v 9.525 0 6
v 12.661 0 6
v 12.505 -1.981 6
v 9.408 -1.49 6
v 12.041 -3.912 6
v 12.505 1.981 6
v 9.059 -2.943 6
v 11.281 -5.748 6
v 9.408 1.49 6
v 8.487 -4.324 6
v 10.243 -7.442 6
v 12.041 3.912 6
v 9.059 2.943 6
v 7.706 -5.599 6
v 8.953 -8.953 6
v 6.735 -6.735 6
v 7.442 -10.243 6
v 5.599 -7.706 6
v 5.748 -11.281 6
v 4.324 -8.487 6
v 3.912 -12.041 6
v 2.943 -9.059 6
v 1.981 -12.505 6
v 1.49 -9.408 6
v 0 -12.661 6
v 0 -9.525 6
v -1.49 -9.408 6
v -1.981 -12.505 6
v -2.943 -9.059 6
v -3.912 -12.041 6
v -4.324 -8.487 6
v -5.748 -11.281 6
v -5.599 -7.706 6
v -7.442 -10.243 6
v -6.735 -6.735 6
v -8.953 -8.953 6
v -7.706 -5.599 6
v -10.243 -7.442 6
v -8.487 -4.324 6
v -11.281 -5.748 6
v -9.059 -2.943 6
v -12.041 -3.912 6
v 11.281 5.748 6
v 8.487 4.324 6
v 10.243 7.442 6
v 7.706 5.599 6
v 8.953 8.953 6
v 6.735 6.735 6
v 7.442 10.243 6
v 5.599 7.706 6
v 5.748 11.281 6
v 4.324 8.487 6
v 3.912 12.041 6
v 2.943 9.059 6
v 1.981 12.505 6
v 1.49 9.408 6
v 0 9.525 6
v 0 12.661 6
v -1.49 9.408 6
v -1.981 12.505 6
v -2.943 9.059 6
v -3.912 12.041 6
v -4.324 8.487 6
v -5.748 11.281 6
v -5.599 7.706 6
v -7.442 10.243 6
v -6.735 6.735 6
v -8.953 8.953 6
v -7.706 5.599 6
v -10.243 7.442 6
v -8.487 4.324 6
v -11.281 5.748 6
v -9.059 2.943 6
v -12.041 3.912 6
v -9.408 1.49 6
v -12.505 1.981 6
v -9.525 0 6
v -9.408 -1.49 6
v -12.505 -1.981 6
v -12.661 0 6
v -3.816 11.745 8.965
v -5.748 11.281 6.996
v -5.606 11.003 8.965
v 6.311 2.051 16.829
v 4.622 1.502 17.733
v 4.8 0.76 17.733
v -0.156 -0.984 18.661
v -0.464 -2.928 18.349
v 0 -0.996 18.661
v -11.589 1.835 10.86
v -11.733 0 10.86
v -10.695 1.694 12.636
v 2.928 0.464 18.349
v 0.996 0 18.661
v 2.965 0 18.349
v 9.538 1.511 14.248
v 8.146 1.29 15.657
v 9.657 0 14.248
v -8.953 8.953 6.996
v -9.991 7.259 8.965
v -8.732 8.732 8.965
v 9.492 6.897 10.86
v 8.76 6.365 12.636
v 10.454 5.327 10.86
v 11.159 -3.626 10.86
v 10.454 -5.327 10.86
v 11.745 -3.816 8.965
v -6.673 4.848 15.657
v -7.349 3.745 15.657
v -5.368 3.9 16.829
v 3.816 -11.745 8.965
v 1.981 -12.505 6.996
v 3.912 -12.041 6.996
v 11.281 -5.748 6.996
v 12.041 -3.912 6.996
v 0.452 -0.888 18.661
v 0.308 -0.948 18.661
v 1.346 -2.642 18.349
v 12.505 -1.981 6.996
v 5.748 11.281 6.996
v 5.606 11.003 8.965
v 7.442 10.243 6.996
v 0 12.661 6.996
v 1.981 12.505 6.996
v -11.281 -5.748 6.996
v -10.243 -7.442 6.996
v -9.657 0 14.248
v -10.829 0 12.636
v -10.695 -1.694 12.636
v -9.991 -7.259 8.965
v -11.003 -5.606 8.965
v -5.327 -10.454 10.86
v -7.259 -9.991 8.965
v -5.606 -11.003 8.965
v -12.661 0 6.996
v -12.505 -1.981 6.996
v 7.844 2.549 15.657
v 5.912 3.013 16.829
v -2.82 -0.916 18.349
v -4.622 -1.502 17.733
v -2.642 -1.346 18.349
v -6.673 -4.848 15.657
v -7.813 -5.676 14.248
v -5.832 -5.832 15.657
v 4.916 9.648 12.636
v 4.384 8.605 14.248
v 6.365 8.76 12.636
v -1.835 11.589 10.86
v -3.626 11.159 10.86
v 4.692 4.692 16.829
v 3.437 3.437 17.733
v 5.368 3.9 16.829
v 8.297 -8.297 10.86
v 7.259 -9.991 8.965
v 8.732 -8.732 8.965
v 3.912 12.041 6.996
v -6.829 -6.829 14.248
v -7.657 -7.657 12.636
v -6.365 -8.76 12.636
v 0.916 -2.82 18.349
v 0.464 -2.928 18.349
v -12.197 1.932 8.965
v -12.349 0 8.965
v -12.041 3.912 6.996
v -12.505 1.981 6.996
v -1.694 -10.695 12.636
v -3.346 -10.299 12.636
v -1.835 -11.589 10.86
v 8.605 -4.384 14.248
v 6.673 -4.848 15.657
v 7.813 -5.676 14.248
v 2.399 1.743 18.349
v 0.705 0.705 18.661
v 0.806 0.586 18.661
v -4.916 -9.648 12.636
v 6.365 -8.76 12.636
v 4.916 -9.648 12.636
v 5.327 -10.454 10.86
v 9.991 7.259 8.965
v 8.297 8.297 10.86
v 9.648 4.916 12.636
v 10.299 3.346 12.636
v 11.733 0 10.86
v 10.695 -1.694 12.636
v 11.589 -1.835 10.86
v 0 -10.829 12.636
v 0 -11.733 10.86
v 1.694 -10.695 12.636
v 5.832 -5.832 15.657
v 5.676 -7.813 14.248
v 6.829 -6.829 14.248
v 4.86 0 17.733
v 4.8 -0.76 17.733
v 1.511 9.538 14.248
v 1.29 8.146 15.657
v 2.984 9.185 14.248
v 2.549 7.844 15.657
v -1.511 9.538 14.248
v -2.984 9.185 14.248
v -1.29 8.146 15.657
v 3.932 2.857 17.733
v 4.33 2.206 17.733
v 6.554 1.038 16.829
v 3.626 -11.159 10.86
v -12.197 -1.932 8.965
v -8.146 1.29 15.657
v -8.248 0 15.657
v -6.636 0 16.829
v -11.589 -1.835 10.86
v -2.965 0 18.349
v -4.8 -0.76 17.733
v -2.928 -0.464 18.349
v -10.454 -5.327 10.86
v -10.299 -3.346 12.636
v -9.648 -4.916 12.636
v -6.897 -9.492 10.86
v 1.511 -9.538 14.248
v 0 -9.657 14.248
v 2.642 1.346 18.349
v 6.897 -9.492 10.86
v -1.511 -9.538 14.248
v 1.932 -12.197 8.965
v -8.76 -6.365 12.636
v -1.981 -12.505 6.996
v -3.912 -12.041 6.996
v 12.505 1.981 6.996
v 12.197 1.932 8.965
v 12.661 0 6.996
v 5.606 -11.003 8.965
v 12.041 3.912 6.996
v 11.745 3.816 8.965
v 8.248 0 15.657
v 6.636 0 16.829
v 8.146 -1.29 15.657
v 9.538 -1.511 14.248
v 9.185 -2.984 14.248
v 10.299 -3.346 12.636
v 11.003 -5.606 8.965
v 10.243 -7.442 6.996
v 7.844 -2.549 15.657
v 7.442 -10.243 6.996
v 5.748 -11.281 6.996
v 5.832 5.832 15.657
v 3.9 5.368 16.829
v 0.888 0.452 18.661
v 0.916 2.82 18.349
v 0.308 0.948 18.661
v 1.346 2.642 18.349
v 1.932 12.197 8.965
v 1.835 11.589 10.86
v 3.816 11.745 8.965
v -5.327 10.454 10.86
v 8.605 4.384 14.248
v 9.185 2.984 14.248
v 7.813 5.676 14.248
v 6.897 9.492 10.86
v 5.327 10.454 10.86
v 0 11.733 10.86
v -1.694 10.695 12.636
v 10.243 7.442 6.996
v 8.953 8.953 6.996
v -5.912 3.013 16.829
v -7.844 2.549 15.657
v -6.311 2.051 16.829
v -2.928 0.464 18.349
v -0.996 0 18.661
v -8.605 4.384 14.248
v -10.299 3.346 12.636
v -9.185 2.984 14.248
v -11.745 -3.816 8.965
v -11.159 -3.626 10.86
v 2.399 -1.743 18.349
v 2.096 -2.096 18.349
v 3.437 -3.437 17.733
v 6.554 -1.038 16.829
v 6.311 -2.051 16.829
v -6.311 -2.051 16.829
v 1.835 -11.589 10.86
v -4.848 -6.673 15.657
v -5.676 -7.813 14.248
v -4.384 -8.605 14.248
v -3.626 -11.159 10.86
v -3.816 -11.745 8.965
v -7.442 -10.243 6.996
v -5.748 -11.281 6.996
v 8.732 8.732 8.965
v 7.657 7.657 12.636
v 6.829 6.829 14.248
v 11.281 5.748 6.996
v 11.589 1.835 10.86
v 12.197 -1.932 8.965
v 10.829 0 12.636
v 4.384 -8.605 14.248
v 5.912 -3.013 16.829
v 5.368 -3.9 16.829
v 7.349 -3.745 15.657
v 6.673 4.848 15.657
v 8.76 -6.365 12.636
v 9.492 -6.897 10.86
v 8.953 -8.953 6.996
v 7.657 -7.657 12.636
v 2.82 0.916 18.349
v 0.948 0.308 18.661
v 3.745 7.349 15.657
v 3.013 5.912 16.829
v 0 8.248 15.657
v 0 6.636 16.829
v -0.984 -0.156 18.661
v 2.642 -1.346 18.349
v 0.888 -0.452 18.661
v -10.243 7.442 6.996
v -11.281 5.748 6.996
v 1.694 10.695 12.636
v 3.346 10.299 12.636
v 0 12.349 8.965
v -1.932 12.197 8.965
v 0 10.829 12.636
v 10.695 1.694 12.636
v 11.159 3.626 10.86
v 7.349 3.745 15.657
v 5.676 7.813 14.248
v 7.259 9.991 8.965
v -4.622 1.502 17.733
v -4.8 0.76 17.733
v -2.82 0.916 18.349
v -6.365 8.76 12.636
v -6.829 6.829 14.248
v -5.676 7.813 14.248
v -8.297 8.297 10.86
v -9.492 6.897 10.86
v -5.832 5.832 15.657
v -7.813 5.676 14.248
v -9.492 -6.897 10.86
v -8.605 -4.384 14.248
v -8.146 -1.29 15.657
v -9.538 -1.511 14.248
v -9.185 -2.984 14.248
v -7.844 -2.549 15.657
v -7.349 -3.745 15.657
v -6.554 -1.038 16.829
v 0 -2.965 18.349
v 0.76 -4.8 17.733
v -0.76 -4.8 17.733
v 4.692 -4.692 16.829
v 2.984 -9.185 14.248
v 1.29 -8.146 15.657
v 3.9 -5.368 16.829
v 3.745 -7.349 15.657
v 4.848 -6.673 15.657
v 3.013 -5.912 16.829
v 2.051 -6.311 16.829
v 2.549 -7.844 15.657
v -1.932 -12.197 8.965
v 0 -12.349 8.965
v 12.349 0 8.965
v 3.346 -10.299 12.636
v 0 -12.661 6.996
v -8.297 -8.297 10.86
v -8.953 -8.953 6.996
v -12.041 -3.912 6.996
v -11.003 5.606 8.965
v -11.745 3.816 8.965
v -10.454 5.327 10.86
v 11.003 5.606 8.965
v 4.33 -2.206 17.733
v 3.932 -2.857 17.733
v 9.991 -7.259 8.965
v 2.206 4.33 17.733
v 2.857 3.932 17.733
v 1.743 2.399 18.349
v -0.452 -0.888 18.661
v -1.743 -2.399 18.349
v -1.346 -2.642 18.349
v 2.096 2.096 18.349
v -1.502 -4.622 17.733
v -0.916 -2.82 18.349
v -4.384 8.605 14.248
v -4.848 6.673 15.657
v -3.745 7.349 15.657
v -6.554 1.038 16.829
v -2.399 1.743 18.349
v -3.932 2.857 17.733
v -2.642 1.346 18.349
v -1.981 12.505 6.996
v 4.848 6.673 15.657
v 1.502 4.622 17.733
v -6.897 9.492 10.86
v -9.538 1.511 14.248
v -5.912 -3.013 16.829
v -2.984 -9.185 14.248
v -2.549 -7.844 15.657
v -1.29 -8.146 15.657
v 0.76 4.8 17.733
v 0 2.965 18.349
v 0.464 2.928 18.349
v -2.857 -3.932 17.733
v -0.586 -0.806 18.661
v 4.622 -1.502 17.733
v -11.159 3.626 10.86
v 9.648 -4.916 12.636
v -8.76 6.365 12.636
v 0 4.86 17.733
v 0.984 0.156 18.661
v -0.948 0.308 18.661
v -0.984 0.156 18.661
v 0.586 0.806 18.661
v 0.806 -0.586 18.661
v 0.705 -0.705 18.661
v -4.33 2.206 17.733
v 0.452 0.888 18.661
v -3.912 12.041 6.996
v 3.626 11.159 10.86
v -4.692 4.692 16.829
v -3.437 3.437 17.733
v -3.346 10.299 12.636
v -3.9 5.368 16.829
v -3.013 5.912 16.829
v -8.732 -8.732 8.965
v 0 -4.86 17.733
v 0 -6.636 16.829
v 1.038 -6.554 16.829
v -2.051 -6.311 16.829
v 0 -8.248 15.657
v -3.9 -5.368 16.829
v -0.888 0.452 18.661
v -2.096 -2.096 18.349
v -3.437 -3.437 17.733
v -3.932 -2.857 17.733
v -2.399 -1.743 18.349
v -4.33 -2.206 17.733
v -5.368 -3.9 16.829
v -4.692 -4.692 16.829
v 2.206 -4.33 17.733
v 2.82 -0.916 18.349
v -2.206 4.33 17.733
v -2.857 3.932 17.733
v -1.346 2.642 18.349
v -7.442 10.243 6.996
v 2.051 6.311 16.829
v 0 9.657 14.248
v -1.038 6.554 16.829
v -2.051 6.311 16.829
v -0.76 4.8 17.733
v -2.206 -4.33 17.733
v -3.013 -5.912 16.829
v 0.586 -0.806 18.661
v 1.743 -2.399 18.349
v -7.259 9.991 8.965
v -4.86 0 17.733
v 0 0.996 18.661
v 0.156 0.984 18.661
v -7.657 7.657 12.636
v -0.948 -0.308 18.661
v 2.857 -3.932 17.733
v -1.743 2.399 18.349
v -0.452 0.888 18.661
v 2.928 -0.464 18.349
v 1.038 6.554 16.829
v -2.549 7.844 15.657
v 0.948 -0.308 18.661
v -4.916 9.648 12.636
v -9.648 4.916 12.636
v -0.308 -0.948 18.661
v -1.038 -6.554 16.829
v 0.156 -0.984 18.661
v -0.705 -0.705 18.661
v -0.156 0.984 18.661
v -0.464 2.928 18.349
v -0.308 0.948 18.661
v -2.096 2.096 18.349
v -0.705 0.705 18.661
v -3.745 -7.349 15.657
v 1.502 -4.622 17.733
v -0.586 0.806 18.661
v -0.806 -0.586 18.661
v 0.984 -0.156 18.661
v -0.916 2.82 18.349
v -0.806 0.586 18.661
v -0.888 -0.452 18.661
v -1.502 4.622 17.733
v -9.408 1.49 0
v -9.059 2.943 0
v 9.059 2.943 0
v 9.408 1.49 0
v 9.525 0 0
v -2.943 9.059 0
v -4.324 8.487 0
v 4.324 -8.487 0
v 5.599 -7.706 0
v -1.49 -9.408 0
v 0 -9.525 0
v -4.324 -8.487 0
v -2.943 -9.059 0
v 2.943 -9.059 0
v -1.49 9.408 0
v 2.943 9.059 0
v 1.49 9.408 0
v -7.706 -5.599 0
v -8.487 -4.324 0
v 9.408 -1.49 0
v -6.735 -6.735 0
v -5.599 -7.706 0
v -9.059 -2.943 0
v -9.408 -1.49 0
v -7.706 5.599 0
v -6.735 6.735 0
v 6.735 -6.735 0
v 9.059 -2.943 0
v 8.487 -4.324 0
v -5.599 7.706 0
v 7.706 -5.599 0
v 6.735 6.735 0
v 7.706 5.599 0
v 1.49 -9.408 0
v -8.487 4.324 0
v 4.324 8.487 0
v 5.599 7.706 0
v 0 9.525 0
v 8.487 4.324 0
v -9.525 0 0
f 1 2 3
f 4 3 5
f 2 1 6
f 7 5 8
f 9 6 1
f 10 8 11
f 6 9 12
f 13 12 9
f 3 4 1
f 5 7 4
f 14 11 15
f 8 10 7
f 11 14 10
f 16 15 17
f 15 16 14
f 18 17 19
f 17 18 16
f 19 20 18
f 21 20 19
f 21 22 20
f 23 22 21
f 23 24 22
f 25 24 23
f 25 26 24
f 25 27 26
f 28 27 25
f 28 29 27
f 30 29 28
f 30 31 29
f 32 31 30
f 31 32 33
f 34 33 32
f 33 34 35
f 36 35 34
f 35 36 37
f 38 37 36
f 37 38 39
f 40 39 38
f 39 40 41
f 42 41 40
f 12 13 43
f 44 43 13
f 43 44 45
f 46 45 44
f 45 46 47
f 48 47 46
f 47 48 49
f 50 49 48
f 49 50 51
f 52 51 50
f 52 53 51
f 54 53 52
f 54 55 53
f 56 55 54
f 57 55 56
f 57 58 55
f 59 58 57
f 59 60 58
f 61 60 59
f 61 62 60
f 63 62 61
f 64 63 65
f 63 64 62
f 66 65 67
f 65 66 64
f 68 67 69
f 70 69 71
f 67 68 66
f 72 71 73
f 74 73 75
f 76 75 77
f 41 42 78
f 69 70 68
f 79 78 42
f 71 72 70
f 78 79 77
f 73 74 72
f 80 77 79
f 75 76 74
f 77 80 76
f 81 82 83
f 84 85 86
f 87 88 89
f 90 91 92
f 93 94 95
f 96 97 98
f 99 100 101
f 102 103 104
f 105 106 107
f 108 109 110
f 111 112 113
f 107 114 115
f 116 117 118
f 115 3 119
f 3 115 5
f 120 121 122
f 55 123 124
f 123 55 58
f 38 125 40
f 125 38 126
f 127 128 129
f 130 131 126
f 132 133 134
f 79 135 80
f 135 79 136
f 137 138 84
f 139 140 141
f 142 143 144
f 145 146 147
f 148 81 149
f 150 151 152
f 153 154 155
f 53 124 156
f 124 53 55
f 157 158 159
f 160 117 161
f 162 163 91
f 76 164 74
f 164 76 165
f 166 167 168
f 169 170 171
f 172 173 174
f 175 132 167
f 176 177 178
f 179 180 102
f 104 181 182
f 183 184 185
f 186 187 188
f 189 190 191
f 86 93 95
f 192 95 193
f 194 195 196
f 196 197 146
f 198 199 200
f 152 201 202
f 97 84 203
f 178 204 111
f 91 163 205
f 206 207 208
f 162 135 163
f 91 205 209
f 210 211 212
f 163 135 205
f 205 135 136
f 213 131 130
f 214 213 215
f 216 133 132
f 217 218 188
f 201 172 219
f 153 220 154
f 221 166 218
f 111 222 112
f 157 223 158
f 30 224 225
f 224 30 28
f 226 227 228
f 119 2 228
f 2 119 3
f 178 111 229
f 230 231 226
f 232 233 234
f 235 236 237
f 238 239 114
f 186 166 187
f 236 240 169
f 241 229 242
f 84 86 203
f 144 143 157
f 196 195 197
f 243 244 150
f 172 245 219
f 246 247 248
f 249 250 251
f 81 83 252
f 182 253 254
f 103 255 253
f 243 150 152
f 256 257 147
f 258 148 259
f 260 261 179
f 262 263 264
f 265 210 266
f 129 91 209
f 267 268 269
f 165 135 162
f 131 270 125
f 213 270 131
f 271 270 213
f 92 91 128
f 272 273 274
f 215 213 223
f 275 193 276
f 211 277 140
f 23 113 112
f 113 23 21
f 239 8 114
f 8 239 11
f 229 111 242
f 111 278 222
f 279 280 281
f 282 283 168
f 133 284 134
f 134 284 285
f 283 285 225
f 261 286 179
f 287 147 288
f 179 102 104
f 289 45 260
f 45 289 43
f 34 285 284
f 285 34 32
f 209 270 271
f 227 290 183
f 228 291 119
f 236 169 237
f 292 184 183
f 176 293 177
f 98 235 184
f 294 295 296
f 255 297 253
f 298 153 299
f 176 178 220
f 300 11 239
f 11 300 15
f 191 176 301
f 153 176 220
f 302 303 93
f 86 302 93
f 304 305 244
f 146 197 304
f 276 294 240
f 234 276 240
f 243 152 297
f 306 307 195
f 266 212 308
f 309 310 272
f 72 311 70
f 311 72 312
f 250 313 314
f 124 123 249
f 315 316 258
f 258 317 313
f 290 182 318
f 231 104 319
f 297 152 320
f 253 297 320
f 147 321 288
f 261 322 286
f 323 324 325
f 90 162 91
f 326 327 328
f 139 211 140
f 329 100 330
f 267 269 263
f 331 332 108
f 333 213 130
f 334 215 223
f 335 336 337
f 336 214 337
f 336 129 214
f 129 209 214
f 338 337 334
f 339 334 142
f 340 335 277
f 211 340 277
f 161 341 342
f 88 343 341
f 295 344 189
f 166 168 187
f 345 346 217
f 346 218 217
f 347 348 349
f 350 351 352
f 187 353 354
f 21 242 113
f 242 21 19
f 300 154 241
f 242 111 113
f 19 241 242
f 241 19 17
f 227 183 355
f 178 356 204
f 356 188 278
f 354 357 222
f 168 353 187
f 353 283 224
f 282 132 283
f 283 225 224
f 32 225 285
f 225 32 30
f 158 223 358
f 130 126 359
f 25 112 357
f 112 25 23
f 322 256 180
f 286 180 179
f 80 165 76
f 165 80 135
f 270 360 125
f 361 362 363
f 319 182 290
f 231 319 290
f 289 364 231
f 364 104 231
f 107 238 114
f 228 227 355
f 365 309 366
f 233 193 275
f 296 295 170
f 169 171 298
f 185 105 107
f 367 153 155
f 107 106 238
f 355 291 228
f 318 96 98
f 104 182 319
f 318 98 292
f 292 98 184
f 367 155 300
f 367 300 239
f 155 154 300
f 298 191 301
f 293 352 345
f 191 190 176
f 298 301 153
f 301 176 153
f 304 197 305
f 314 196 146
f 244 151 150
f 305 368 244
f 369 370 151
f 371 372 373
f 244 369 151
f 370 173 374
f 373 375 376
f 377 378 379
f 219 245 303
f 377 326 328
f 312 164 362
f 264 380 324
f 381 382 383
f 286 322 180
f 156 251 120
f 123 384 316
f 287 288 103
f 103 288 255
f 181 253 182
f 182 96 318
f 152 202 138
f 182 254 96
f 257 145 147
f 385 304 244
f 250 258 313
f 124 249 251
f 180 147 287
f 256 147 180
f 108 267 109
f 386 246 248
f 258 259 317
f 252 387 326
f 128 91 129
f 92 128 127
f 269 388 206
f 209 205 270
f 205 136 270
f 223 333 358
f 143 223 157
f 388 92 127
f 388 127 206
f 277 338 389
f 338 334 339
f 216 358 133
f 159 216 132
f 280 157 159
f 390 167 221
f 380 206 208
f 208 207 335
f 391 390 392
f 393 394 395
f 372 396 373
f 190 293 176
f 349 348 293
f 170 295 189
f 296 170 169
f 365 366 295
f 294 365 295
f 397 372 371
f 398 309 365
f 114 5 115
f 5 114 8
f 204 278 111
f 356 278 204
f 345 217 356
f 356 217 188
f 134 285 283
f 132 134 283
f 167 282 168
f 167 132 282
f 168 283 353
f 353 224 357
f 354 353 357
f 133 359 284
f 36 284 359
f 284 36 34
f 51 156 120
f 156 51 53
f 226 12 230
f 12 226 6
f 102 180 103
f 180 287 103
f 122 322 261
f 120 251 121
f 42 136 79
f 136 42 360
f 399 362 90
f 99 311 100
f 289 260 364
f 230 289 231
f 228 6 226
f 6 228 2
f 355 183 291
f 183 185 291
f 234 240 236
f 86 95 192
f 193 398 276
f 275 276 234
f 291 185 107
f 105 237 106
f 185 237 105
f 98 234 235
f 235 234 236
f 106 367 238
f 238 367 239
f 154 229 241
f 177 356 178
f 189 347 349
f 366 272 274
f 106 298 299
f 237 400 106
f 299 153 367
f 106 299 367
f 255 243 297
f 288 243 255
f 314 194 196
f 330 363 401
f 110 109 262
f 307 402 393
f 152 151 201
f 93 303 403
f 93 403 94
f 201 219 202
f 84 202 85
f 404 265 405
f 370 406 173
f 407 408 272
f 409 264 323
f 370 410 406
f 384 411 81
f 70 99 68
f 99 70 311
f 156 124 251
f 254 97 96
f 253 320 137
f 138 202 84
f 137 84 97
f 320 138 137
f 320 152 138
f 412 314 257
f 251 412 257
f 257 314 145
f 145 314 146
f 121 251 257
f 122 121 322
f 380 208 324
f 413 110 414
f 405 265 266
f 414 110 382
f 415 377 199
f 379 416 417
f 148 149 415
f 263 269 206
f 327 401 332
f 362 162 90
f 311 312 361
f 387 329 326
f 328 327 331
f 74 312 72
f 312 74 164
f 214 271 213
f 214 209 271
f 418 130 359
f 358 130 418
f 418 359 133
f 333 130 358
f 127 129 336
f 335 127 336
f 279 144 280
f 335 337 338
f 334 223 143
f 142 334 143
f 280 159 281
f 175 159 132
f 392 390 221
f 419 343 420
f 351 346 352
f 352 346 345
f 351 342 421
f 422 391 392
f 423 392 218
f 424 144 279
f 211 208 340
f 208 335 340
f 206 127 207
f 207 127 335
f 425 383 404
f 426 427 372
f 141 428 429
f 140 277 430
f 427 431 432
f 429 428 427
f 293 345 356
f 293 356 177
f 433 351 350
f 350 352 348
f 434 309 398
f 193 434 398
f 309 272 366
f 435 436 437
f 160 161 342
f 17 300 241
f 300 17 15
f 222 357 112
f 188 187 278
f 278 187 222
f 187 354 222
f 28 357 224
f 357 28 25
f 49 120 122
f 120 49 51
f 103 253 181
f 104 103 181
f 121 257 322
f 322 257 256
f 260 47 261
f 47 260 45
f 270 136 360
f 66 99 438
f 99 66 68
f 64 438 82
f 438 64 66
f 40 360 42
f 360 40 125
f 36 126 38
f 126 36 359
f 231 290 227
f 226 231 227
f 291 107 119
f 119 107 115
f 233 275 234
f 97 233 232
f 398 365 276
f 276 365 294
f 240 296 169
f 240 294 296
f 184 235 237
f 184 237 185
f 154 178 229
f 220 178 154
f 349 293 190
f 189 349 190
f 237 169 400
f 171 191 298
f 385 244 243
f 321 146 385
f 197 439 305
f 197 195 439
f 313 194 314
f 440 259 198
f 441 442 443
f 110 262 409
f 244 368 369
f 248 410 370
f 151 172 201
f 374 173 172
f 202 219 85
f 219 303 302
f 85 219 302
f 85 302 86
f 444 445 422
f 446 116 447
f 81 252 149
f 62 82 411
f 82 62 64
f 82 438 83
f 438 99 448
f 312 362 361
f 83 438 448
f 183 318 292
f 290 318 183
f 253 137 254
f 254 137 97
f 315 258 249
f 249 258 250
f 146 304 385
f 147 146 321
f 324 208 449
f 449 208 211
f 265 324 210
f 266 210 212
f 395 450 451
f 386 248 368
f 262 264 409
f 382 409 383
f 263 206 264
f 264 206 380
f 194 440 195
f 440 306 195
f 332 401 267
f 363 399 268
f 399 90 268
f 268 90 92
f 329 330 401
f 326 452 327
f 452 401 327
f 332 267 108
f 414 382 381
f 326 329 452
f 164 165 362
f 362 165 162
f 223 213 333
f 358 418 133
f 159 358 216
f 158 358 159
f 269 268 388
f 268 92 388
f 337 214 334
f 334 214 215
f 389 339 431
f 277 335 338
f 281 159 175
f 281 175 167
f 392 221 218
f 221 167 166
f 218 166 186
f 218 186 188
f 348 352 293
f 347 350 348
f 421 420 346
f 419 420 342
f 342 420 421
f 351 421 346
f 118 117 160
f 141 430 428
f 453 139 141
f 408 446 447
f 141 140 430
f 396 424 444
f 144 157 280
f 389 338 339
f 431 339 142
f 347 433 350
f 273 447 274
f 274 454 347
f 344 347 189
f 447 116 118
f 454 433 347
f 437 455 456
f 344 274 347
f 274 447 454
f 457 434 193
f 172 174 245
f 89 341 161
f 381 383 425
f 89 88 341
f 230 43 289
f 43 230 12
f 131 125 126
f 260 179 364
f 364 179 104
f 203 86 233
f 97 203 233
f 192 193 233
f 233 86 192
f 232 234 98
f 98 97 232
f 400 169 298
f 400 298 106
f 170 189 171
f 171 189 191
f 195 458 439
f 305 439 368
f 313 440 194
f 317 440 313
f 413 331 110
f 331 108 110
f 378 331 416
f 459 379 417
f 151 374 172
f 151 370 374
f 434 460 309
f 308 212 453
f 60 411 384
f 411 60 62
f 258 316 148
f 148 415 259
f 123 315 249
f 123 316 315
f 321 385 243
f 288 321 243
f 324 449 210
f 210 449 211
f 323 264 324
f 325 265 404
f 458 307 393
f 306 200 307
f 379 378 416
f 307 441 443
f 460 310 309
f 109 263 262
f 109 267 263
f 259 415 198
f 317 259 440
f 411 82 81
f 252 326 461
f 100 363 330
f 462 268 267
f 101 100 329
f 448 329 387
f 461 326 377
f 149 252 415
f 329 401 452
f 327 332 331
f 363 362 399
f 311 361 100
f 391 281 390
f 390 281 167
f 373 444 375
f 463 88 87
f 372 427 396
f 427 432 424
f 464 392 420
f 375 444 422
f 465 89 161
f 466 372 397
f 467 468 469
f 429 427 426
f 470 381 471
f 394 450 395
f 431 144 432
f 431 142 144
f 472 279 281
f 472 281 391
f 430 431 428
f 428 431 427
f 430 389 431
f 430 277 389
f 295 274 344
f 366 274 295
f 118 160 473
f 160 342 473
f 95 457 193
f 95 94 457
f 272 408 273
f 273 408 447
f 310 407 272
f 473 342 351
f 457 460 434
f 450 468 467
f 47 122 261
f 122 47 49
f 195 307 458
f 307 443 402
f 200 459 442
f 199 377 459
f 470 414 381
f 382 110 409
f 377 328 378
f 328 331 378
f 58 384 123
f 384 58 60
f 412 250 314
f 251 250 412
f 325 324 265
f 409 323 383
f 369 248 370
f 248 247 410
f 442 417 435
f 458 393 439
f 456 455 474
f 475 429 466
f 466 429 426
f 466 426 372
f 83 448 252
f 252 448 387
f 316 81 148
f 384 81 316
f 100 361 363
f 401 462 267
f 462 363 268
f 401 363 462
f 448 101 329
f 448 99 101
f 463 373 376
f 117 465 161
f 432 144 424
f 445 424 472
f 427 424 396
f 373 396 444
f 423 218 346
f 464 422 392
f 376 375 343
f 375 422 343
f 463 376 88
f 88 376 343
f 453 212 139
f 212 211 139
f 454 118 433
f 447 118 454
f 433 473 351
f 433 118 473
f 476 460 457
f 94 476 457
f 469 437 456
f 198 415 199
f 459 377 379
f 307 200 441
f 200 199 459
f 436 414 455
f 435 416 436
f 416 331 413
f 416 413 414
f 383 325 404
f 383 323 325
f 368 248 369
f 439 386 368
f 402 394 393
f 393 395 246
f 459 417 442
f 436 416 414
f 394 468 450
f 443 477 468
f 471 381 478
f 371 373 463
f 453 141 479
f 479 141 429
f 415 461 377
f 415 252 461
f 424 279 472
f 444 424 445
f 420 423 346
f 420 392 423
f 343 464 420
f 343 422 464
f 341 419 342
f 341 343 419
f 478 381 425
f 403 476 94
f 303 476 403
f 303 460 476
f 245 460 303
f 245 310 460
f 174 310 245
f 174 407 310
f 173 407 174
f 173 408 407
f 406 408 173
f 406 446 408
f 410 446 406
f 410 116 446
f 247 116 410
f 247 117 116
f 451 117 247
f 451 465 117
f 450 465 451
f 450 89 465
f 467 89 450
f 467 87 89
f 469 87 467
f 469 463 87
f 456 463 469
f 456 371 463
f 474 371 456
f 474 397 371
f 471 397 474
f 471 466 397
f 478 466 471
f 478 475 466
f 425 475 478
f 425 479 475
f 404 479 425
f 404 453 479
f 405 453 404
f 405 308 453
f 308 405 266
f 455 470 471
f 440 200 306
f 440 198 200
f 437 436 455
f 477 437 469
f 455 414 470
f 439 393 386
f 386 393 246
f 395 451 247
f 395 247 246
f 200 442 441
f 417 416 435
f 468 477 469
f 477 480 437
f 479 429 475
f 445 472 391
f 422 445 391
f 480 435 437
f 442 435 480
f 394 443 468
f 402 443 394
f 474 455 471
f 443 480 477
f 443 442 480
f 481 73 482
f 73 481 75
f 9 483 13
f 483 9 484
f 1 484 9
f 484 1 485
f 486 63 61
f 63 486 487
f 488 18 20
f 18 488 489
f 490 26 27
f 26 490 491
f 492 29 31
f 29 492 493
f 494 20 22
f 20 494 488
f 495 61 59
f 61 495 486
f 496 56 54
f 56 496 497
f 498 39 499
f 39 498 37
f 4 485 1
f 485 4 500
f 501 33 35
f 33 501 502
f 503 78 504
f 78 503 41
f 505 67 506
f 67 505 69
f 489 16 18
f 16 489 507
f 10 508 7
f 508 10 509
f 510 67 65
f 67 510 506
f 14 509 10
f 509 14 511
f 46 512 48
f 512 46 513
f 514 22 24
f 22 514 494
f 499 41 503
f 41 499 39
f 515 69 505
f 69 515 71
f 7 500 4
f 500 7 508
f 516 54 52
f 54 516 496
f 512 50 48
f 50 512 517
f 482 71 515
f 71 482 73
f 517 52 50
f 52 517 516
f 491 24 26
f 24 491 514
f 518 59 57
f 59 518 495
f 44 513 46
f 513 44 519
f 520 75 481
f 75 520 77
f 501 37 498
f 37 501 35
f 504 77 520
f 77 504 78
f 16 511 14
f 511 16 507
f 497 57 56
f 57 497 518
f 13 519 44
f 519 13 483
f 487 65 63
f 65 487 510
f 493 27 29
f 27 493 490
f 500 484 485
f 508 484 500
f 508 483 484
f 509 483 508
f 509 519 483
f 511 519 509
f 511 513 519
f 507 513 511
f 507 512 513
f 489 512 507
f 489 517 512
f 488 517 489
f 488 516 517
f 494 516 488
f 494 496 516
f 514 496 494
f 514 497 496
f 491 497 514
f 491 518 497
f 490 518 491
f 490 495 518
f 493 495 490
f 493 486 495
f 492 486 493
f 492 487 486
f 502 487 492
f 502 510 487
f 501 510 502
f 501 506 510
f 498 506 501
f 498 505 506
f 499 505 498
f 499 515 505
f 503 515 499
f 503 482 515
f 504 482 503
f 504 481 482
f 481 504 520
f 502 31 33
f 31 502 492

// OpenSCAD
//INNER = 0.88 * 25.4;
INNER = 0.75 * 25.4;
OUTER = 1.00 * 25.4;
H = 6.0;

$fn = 40;

cylinder(h=H, d=INNER);
translate([0, 0, H]) {
    intersection() {
        translate([-50, -50, 0]) cube(size=100, 100, 100);
        sphere(d=OUTER);
    }
}
